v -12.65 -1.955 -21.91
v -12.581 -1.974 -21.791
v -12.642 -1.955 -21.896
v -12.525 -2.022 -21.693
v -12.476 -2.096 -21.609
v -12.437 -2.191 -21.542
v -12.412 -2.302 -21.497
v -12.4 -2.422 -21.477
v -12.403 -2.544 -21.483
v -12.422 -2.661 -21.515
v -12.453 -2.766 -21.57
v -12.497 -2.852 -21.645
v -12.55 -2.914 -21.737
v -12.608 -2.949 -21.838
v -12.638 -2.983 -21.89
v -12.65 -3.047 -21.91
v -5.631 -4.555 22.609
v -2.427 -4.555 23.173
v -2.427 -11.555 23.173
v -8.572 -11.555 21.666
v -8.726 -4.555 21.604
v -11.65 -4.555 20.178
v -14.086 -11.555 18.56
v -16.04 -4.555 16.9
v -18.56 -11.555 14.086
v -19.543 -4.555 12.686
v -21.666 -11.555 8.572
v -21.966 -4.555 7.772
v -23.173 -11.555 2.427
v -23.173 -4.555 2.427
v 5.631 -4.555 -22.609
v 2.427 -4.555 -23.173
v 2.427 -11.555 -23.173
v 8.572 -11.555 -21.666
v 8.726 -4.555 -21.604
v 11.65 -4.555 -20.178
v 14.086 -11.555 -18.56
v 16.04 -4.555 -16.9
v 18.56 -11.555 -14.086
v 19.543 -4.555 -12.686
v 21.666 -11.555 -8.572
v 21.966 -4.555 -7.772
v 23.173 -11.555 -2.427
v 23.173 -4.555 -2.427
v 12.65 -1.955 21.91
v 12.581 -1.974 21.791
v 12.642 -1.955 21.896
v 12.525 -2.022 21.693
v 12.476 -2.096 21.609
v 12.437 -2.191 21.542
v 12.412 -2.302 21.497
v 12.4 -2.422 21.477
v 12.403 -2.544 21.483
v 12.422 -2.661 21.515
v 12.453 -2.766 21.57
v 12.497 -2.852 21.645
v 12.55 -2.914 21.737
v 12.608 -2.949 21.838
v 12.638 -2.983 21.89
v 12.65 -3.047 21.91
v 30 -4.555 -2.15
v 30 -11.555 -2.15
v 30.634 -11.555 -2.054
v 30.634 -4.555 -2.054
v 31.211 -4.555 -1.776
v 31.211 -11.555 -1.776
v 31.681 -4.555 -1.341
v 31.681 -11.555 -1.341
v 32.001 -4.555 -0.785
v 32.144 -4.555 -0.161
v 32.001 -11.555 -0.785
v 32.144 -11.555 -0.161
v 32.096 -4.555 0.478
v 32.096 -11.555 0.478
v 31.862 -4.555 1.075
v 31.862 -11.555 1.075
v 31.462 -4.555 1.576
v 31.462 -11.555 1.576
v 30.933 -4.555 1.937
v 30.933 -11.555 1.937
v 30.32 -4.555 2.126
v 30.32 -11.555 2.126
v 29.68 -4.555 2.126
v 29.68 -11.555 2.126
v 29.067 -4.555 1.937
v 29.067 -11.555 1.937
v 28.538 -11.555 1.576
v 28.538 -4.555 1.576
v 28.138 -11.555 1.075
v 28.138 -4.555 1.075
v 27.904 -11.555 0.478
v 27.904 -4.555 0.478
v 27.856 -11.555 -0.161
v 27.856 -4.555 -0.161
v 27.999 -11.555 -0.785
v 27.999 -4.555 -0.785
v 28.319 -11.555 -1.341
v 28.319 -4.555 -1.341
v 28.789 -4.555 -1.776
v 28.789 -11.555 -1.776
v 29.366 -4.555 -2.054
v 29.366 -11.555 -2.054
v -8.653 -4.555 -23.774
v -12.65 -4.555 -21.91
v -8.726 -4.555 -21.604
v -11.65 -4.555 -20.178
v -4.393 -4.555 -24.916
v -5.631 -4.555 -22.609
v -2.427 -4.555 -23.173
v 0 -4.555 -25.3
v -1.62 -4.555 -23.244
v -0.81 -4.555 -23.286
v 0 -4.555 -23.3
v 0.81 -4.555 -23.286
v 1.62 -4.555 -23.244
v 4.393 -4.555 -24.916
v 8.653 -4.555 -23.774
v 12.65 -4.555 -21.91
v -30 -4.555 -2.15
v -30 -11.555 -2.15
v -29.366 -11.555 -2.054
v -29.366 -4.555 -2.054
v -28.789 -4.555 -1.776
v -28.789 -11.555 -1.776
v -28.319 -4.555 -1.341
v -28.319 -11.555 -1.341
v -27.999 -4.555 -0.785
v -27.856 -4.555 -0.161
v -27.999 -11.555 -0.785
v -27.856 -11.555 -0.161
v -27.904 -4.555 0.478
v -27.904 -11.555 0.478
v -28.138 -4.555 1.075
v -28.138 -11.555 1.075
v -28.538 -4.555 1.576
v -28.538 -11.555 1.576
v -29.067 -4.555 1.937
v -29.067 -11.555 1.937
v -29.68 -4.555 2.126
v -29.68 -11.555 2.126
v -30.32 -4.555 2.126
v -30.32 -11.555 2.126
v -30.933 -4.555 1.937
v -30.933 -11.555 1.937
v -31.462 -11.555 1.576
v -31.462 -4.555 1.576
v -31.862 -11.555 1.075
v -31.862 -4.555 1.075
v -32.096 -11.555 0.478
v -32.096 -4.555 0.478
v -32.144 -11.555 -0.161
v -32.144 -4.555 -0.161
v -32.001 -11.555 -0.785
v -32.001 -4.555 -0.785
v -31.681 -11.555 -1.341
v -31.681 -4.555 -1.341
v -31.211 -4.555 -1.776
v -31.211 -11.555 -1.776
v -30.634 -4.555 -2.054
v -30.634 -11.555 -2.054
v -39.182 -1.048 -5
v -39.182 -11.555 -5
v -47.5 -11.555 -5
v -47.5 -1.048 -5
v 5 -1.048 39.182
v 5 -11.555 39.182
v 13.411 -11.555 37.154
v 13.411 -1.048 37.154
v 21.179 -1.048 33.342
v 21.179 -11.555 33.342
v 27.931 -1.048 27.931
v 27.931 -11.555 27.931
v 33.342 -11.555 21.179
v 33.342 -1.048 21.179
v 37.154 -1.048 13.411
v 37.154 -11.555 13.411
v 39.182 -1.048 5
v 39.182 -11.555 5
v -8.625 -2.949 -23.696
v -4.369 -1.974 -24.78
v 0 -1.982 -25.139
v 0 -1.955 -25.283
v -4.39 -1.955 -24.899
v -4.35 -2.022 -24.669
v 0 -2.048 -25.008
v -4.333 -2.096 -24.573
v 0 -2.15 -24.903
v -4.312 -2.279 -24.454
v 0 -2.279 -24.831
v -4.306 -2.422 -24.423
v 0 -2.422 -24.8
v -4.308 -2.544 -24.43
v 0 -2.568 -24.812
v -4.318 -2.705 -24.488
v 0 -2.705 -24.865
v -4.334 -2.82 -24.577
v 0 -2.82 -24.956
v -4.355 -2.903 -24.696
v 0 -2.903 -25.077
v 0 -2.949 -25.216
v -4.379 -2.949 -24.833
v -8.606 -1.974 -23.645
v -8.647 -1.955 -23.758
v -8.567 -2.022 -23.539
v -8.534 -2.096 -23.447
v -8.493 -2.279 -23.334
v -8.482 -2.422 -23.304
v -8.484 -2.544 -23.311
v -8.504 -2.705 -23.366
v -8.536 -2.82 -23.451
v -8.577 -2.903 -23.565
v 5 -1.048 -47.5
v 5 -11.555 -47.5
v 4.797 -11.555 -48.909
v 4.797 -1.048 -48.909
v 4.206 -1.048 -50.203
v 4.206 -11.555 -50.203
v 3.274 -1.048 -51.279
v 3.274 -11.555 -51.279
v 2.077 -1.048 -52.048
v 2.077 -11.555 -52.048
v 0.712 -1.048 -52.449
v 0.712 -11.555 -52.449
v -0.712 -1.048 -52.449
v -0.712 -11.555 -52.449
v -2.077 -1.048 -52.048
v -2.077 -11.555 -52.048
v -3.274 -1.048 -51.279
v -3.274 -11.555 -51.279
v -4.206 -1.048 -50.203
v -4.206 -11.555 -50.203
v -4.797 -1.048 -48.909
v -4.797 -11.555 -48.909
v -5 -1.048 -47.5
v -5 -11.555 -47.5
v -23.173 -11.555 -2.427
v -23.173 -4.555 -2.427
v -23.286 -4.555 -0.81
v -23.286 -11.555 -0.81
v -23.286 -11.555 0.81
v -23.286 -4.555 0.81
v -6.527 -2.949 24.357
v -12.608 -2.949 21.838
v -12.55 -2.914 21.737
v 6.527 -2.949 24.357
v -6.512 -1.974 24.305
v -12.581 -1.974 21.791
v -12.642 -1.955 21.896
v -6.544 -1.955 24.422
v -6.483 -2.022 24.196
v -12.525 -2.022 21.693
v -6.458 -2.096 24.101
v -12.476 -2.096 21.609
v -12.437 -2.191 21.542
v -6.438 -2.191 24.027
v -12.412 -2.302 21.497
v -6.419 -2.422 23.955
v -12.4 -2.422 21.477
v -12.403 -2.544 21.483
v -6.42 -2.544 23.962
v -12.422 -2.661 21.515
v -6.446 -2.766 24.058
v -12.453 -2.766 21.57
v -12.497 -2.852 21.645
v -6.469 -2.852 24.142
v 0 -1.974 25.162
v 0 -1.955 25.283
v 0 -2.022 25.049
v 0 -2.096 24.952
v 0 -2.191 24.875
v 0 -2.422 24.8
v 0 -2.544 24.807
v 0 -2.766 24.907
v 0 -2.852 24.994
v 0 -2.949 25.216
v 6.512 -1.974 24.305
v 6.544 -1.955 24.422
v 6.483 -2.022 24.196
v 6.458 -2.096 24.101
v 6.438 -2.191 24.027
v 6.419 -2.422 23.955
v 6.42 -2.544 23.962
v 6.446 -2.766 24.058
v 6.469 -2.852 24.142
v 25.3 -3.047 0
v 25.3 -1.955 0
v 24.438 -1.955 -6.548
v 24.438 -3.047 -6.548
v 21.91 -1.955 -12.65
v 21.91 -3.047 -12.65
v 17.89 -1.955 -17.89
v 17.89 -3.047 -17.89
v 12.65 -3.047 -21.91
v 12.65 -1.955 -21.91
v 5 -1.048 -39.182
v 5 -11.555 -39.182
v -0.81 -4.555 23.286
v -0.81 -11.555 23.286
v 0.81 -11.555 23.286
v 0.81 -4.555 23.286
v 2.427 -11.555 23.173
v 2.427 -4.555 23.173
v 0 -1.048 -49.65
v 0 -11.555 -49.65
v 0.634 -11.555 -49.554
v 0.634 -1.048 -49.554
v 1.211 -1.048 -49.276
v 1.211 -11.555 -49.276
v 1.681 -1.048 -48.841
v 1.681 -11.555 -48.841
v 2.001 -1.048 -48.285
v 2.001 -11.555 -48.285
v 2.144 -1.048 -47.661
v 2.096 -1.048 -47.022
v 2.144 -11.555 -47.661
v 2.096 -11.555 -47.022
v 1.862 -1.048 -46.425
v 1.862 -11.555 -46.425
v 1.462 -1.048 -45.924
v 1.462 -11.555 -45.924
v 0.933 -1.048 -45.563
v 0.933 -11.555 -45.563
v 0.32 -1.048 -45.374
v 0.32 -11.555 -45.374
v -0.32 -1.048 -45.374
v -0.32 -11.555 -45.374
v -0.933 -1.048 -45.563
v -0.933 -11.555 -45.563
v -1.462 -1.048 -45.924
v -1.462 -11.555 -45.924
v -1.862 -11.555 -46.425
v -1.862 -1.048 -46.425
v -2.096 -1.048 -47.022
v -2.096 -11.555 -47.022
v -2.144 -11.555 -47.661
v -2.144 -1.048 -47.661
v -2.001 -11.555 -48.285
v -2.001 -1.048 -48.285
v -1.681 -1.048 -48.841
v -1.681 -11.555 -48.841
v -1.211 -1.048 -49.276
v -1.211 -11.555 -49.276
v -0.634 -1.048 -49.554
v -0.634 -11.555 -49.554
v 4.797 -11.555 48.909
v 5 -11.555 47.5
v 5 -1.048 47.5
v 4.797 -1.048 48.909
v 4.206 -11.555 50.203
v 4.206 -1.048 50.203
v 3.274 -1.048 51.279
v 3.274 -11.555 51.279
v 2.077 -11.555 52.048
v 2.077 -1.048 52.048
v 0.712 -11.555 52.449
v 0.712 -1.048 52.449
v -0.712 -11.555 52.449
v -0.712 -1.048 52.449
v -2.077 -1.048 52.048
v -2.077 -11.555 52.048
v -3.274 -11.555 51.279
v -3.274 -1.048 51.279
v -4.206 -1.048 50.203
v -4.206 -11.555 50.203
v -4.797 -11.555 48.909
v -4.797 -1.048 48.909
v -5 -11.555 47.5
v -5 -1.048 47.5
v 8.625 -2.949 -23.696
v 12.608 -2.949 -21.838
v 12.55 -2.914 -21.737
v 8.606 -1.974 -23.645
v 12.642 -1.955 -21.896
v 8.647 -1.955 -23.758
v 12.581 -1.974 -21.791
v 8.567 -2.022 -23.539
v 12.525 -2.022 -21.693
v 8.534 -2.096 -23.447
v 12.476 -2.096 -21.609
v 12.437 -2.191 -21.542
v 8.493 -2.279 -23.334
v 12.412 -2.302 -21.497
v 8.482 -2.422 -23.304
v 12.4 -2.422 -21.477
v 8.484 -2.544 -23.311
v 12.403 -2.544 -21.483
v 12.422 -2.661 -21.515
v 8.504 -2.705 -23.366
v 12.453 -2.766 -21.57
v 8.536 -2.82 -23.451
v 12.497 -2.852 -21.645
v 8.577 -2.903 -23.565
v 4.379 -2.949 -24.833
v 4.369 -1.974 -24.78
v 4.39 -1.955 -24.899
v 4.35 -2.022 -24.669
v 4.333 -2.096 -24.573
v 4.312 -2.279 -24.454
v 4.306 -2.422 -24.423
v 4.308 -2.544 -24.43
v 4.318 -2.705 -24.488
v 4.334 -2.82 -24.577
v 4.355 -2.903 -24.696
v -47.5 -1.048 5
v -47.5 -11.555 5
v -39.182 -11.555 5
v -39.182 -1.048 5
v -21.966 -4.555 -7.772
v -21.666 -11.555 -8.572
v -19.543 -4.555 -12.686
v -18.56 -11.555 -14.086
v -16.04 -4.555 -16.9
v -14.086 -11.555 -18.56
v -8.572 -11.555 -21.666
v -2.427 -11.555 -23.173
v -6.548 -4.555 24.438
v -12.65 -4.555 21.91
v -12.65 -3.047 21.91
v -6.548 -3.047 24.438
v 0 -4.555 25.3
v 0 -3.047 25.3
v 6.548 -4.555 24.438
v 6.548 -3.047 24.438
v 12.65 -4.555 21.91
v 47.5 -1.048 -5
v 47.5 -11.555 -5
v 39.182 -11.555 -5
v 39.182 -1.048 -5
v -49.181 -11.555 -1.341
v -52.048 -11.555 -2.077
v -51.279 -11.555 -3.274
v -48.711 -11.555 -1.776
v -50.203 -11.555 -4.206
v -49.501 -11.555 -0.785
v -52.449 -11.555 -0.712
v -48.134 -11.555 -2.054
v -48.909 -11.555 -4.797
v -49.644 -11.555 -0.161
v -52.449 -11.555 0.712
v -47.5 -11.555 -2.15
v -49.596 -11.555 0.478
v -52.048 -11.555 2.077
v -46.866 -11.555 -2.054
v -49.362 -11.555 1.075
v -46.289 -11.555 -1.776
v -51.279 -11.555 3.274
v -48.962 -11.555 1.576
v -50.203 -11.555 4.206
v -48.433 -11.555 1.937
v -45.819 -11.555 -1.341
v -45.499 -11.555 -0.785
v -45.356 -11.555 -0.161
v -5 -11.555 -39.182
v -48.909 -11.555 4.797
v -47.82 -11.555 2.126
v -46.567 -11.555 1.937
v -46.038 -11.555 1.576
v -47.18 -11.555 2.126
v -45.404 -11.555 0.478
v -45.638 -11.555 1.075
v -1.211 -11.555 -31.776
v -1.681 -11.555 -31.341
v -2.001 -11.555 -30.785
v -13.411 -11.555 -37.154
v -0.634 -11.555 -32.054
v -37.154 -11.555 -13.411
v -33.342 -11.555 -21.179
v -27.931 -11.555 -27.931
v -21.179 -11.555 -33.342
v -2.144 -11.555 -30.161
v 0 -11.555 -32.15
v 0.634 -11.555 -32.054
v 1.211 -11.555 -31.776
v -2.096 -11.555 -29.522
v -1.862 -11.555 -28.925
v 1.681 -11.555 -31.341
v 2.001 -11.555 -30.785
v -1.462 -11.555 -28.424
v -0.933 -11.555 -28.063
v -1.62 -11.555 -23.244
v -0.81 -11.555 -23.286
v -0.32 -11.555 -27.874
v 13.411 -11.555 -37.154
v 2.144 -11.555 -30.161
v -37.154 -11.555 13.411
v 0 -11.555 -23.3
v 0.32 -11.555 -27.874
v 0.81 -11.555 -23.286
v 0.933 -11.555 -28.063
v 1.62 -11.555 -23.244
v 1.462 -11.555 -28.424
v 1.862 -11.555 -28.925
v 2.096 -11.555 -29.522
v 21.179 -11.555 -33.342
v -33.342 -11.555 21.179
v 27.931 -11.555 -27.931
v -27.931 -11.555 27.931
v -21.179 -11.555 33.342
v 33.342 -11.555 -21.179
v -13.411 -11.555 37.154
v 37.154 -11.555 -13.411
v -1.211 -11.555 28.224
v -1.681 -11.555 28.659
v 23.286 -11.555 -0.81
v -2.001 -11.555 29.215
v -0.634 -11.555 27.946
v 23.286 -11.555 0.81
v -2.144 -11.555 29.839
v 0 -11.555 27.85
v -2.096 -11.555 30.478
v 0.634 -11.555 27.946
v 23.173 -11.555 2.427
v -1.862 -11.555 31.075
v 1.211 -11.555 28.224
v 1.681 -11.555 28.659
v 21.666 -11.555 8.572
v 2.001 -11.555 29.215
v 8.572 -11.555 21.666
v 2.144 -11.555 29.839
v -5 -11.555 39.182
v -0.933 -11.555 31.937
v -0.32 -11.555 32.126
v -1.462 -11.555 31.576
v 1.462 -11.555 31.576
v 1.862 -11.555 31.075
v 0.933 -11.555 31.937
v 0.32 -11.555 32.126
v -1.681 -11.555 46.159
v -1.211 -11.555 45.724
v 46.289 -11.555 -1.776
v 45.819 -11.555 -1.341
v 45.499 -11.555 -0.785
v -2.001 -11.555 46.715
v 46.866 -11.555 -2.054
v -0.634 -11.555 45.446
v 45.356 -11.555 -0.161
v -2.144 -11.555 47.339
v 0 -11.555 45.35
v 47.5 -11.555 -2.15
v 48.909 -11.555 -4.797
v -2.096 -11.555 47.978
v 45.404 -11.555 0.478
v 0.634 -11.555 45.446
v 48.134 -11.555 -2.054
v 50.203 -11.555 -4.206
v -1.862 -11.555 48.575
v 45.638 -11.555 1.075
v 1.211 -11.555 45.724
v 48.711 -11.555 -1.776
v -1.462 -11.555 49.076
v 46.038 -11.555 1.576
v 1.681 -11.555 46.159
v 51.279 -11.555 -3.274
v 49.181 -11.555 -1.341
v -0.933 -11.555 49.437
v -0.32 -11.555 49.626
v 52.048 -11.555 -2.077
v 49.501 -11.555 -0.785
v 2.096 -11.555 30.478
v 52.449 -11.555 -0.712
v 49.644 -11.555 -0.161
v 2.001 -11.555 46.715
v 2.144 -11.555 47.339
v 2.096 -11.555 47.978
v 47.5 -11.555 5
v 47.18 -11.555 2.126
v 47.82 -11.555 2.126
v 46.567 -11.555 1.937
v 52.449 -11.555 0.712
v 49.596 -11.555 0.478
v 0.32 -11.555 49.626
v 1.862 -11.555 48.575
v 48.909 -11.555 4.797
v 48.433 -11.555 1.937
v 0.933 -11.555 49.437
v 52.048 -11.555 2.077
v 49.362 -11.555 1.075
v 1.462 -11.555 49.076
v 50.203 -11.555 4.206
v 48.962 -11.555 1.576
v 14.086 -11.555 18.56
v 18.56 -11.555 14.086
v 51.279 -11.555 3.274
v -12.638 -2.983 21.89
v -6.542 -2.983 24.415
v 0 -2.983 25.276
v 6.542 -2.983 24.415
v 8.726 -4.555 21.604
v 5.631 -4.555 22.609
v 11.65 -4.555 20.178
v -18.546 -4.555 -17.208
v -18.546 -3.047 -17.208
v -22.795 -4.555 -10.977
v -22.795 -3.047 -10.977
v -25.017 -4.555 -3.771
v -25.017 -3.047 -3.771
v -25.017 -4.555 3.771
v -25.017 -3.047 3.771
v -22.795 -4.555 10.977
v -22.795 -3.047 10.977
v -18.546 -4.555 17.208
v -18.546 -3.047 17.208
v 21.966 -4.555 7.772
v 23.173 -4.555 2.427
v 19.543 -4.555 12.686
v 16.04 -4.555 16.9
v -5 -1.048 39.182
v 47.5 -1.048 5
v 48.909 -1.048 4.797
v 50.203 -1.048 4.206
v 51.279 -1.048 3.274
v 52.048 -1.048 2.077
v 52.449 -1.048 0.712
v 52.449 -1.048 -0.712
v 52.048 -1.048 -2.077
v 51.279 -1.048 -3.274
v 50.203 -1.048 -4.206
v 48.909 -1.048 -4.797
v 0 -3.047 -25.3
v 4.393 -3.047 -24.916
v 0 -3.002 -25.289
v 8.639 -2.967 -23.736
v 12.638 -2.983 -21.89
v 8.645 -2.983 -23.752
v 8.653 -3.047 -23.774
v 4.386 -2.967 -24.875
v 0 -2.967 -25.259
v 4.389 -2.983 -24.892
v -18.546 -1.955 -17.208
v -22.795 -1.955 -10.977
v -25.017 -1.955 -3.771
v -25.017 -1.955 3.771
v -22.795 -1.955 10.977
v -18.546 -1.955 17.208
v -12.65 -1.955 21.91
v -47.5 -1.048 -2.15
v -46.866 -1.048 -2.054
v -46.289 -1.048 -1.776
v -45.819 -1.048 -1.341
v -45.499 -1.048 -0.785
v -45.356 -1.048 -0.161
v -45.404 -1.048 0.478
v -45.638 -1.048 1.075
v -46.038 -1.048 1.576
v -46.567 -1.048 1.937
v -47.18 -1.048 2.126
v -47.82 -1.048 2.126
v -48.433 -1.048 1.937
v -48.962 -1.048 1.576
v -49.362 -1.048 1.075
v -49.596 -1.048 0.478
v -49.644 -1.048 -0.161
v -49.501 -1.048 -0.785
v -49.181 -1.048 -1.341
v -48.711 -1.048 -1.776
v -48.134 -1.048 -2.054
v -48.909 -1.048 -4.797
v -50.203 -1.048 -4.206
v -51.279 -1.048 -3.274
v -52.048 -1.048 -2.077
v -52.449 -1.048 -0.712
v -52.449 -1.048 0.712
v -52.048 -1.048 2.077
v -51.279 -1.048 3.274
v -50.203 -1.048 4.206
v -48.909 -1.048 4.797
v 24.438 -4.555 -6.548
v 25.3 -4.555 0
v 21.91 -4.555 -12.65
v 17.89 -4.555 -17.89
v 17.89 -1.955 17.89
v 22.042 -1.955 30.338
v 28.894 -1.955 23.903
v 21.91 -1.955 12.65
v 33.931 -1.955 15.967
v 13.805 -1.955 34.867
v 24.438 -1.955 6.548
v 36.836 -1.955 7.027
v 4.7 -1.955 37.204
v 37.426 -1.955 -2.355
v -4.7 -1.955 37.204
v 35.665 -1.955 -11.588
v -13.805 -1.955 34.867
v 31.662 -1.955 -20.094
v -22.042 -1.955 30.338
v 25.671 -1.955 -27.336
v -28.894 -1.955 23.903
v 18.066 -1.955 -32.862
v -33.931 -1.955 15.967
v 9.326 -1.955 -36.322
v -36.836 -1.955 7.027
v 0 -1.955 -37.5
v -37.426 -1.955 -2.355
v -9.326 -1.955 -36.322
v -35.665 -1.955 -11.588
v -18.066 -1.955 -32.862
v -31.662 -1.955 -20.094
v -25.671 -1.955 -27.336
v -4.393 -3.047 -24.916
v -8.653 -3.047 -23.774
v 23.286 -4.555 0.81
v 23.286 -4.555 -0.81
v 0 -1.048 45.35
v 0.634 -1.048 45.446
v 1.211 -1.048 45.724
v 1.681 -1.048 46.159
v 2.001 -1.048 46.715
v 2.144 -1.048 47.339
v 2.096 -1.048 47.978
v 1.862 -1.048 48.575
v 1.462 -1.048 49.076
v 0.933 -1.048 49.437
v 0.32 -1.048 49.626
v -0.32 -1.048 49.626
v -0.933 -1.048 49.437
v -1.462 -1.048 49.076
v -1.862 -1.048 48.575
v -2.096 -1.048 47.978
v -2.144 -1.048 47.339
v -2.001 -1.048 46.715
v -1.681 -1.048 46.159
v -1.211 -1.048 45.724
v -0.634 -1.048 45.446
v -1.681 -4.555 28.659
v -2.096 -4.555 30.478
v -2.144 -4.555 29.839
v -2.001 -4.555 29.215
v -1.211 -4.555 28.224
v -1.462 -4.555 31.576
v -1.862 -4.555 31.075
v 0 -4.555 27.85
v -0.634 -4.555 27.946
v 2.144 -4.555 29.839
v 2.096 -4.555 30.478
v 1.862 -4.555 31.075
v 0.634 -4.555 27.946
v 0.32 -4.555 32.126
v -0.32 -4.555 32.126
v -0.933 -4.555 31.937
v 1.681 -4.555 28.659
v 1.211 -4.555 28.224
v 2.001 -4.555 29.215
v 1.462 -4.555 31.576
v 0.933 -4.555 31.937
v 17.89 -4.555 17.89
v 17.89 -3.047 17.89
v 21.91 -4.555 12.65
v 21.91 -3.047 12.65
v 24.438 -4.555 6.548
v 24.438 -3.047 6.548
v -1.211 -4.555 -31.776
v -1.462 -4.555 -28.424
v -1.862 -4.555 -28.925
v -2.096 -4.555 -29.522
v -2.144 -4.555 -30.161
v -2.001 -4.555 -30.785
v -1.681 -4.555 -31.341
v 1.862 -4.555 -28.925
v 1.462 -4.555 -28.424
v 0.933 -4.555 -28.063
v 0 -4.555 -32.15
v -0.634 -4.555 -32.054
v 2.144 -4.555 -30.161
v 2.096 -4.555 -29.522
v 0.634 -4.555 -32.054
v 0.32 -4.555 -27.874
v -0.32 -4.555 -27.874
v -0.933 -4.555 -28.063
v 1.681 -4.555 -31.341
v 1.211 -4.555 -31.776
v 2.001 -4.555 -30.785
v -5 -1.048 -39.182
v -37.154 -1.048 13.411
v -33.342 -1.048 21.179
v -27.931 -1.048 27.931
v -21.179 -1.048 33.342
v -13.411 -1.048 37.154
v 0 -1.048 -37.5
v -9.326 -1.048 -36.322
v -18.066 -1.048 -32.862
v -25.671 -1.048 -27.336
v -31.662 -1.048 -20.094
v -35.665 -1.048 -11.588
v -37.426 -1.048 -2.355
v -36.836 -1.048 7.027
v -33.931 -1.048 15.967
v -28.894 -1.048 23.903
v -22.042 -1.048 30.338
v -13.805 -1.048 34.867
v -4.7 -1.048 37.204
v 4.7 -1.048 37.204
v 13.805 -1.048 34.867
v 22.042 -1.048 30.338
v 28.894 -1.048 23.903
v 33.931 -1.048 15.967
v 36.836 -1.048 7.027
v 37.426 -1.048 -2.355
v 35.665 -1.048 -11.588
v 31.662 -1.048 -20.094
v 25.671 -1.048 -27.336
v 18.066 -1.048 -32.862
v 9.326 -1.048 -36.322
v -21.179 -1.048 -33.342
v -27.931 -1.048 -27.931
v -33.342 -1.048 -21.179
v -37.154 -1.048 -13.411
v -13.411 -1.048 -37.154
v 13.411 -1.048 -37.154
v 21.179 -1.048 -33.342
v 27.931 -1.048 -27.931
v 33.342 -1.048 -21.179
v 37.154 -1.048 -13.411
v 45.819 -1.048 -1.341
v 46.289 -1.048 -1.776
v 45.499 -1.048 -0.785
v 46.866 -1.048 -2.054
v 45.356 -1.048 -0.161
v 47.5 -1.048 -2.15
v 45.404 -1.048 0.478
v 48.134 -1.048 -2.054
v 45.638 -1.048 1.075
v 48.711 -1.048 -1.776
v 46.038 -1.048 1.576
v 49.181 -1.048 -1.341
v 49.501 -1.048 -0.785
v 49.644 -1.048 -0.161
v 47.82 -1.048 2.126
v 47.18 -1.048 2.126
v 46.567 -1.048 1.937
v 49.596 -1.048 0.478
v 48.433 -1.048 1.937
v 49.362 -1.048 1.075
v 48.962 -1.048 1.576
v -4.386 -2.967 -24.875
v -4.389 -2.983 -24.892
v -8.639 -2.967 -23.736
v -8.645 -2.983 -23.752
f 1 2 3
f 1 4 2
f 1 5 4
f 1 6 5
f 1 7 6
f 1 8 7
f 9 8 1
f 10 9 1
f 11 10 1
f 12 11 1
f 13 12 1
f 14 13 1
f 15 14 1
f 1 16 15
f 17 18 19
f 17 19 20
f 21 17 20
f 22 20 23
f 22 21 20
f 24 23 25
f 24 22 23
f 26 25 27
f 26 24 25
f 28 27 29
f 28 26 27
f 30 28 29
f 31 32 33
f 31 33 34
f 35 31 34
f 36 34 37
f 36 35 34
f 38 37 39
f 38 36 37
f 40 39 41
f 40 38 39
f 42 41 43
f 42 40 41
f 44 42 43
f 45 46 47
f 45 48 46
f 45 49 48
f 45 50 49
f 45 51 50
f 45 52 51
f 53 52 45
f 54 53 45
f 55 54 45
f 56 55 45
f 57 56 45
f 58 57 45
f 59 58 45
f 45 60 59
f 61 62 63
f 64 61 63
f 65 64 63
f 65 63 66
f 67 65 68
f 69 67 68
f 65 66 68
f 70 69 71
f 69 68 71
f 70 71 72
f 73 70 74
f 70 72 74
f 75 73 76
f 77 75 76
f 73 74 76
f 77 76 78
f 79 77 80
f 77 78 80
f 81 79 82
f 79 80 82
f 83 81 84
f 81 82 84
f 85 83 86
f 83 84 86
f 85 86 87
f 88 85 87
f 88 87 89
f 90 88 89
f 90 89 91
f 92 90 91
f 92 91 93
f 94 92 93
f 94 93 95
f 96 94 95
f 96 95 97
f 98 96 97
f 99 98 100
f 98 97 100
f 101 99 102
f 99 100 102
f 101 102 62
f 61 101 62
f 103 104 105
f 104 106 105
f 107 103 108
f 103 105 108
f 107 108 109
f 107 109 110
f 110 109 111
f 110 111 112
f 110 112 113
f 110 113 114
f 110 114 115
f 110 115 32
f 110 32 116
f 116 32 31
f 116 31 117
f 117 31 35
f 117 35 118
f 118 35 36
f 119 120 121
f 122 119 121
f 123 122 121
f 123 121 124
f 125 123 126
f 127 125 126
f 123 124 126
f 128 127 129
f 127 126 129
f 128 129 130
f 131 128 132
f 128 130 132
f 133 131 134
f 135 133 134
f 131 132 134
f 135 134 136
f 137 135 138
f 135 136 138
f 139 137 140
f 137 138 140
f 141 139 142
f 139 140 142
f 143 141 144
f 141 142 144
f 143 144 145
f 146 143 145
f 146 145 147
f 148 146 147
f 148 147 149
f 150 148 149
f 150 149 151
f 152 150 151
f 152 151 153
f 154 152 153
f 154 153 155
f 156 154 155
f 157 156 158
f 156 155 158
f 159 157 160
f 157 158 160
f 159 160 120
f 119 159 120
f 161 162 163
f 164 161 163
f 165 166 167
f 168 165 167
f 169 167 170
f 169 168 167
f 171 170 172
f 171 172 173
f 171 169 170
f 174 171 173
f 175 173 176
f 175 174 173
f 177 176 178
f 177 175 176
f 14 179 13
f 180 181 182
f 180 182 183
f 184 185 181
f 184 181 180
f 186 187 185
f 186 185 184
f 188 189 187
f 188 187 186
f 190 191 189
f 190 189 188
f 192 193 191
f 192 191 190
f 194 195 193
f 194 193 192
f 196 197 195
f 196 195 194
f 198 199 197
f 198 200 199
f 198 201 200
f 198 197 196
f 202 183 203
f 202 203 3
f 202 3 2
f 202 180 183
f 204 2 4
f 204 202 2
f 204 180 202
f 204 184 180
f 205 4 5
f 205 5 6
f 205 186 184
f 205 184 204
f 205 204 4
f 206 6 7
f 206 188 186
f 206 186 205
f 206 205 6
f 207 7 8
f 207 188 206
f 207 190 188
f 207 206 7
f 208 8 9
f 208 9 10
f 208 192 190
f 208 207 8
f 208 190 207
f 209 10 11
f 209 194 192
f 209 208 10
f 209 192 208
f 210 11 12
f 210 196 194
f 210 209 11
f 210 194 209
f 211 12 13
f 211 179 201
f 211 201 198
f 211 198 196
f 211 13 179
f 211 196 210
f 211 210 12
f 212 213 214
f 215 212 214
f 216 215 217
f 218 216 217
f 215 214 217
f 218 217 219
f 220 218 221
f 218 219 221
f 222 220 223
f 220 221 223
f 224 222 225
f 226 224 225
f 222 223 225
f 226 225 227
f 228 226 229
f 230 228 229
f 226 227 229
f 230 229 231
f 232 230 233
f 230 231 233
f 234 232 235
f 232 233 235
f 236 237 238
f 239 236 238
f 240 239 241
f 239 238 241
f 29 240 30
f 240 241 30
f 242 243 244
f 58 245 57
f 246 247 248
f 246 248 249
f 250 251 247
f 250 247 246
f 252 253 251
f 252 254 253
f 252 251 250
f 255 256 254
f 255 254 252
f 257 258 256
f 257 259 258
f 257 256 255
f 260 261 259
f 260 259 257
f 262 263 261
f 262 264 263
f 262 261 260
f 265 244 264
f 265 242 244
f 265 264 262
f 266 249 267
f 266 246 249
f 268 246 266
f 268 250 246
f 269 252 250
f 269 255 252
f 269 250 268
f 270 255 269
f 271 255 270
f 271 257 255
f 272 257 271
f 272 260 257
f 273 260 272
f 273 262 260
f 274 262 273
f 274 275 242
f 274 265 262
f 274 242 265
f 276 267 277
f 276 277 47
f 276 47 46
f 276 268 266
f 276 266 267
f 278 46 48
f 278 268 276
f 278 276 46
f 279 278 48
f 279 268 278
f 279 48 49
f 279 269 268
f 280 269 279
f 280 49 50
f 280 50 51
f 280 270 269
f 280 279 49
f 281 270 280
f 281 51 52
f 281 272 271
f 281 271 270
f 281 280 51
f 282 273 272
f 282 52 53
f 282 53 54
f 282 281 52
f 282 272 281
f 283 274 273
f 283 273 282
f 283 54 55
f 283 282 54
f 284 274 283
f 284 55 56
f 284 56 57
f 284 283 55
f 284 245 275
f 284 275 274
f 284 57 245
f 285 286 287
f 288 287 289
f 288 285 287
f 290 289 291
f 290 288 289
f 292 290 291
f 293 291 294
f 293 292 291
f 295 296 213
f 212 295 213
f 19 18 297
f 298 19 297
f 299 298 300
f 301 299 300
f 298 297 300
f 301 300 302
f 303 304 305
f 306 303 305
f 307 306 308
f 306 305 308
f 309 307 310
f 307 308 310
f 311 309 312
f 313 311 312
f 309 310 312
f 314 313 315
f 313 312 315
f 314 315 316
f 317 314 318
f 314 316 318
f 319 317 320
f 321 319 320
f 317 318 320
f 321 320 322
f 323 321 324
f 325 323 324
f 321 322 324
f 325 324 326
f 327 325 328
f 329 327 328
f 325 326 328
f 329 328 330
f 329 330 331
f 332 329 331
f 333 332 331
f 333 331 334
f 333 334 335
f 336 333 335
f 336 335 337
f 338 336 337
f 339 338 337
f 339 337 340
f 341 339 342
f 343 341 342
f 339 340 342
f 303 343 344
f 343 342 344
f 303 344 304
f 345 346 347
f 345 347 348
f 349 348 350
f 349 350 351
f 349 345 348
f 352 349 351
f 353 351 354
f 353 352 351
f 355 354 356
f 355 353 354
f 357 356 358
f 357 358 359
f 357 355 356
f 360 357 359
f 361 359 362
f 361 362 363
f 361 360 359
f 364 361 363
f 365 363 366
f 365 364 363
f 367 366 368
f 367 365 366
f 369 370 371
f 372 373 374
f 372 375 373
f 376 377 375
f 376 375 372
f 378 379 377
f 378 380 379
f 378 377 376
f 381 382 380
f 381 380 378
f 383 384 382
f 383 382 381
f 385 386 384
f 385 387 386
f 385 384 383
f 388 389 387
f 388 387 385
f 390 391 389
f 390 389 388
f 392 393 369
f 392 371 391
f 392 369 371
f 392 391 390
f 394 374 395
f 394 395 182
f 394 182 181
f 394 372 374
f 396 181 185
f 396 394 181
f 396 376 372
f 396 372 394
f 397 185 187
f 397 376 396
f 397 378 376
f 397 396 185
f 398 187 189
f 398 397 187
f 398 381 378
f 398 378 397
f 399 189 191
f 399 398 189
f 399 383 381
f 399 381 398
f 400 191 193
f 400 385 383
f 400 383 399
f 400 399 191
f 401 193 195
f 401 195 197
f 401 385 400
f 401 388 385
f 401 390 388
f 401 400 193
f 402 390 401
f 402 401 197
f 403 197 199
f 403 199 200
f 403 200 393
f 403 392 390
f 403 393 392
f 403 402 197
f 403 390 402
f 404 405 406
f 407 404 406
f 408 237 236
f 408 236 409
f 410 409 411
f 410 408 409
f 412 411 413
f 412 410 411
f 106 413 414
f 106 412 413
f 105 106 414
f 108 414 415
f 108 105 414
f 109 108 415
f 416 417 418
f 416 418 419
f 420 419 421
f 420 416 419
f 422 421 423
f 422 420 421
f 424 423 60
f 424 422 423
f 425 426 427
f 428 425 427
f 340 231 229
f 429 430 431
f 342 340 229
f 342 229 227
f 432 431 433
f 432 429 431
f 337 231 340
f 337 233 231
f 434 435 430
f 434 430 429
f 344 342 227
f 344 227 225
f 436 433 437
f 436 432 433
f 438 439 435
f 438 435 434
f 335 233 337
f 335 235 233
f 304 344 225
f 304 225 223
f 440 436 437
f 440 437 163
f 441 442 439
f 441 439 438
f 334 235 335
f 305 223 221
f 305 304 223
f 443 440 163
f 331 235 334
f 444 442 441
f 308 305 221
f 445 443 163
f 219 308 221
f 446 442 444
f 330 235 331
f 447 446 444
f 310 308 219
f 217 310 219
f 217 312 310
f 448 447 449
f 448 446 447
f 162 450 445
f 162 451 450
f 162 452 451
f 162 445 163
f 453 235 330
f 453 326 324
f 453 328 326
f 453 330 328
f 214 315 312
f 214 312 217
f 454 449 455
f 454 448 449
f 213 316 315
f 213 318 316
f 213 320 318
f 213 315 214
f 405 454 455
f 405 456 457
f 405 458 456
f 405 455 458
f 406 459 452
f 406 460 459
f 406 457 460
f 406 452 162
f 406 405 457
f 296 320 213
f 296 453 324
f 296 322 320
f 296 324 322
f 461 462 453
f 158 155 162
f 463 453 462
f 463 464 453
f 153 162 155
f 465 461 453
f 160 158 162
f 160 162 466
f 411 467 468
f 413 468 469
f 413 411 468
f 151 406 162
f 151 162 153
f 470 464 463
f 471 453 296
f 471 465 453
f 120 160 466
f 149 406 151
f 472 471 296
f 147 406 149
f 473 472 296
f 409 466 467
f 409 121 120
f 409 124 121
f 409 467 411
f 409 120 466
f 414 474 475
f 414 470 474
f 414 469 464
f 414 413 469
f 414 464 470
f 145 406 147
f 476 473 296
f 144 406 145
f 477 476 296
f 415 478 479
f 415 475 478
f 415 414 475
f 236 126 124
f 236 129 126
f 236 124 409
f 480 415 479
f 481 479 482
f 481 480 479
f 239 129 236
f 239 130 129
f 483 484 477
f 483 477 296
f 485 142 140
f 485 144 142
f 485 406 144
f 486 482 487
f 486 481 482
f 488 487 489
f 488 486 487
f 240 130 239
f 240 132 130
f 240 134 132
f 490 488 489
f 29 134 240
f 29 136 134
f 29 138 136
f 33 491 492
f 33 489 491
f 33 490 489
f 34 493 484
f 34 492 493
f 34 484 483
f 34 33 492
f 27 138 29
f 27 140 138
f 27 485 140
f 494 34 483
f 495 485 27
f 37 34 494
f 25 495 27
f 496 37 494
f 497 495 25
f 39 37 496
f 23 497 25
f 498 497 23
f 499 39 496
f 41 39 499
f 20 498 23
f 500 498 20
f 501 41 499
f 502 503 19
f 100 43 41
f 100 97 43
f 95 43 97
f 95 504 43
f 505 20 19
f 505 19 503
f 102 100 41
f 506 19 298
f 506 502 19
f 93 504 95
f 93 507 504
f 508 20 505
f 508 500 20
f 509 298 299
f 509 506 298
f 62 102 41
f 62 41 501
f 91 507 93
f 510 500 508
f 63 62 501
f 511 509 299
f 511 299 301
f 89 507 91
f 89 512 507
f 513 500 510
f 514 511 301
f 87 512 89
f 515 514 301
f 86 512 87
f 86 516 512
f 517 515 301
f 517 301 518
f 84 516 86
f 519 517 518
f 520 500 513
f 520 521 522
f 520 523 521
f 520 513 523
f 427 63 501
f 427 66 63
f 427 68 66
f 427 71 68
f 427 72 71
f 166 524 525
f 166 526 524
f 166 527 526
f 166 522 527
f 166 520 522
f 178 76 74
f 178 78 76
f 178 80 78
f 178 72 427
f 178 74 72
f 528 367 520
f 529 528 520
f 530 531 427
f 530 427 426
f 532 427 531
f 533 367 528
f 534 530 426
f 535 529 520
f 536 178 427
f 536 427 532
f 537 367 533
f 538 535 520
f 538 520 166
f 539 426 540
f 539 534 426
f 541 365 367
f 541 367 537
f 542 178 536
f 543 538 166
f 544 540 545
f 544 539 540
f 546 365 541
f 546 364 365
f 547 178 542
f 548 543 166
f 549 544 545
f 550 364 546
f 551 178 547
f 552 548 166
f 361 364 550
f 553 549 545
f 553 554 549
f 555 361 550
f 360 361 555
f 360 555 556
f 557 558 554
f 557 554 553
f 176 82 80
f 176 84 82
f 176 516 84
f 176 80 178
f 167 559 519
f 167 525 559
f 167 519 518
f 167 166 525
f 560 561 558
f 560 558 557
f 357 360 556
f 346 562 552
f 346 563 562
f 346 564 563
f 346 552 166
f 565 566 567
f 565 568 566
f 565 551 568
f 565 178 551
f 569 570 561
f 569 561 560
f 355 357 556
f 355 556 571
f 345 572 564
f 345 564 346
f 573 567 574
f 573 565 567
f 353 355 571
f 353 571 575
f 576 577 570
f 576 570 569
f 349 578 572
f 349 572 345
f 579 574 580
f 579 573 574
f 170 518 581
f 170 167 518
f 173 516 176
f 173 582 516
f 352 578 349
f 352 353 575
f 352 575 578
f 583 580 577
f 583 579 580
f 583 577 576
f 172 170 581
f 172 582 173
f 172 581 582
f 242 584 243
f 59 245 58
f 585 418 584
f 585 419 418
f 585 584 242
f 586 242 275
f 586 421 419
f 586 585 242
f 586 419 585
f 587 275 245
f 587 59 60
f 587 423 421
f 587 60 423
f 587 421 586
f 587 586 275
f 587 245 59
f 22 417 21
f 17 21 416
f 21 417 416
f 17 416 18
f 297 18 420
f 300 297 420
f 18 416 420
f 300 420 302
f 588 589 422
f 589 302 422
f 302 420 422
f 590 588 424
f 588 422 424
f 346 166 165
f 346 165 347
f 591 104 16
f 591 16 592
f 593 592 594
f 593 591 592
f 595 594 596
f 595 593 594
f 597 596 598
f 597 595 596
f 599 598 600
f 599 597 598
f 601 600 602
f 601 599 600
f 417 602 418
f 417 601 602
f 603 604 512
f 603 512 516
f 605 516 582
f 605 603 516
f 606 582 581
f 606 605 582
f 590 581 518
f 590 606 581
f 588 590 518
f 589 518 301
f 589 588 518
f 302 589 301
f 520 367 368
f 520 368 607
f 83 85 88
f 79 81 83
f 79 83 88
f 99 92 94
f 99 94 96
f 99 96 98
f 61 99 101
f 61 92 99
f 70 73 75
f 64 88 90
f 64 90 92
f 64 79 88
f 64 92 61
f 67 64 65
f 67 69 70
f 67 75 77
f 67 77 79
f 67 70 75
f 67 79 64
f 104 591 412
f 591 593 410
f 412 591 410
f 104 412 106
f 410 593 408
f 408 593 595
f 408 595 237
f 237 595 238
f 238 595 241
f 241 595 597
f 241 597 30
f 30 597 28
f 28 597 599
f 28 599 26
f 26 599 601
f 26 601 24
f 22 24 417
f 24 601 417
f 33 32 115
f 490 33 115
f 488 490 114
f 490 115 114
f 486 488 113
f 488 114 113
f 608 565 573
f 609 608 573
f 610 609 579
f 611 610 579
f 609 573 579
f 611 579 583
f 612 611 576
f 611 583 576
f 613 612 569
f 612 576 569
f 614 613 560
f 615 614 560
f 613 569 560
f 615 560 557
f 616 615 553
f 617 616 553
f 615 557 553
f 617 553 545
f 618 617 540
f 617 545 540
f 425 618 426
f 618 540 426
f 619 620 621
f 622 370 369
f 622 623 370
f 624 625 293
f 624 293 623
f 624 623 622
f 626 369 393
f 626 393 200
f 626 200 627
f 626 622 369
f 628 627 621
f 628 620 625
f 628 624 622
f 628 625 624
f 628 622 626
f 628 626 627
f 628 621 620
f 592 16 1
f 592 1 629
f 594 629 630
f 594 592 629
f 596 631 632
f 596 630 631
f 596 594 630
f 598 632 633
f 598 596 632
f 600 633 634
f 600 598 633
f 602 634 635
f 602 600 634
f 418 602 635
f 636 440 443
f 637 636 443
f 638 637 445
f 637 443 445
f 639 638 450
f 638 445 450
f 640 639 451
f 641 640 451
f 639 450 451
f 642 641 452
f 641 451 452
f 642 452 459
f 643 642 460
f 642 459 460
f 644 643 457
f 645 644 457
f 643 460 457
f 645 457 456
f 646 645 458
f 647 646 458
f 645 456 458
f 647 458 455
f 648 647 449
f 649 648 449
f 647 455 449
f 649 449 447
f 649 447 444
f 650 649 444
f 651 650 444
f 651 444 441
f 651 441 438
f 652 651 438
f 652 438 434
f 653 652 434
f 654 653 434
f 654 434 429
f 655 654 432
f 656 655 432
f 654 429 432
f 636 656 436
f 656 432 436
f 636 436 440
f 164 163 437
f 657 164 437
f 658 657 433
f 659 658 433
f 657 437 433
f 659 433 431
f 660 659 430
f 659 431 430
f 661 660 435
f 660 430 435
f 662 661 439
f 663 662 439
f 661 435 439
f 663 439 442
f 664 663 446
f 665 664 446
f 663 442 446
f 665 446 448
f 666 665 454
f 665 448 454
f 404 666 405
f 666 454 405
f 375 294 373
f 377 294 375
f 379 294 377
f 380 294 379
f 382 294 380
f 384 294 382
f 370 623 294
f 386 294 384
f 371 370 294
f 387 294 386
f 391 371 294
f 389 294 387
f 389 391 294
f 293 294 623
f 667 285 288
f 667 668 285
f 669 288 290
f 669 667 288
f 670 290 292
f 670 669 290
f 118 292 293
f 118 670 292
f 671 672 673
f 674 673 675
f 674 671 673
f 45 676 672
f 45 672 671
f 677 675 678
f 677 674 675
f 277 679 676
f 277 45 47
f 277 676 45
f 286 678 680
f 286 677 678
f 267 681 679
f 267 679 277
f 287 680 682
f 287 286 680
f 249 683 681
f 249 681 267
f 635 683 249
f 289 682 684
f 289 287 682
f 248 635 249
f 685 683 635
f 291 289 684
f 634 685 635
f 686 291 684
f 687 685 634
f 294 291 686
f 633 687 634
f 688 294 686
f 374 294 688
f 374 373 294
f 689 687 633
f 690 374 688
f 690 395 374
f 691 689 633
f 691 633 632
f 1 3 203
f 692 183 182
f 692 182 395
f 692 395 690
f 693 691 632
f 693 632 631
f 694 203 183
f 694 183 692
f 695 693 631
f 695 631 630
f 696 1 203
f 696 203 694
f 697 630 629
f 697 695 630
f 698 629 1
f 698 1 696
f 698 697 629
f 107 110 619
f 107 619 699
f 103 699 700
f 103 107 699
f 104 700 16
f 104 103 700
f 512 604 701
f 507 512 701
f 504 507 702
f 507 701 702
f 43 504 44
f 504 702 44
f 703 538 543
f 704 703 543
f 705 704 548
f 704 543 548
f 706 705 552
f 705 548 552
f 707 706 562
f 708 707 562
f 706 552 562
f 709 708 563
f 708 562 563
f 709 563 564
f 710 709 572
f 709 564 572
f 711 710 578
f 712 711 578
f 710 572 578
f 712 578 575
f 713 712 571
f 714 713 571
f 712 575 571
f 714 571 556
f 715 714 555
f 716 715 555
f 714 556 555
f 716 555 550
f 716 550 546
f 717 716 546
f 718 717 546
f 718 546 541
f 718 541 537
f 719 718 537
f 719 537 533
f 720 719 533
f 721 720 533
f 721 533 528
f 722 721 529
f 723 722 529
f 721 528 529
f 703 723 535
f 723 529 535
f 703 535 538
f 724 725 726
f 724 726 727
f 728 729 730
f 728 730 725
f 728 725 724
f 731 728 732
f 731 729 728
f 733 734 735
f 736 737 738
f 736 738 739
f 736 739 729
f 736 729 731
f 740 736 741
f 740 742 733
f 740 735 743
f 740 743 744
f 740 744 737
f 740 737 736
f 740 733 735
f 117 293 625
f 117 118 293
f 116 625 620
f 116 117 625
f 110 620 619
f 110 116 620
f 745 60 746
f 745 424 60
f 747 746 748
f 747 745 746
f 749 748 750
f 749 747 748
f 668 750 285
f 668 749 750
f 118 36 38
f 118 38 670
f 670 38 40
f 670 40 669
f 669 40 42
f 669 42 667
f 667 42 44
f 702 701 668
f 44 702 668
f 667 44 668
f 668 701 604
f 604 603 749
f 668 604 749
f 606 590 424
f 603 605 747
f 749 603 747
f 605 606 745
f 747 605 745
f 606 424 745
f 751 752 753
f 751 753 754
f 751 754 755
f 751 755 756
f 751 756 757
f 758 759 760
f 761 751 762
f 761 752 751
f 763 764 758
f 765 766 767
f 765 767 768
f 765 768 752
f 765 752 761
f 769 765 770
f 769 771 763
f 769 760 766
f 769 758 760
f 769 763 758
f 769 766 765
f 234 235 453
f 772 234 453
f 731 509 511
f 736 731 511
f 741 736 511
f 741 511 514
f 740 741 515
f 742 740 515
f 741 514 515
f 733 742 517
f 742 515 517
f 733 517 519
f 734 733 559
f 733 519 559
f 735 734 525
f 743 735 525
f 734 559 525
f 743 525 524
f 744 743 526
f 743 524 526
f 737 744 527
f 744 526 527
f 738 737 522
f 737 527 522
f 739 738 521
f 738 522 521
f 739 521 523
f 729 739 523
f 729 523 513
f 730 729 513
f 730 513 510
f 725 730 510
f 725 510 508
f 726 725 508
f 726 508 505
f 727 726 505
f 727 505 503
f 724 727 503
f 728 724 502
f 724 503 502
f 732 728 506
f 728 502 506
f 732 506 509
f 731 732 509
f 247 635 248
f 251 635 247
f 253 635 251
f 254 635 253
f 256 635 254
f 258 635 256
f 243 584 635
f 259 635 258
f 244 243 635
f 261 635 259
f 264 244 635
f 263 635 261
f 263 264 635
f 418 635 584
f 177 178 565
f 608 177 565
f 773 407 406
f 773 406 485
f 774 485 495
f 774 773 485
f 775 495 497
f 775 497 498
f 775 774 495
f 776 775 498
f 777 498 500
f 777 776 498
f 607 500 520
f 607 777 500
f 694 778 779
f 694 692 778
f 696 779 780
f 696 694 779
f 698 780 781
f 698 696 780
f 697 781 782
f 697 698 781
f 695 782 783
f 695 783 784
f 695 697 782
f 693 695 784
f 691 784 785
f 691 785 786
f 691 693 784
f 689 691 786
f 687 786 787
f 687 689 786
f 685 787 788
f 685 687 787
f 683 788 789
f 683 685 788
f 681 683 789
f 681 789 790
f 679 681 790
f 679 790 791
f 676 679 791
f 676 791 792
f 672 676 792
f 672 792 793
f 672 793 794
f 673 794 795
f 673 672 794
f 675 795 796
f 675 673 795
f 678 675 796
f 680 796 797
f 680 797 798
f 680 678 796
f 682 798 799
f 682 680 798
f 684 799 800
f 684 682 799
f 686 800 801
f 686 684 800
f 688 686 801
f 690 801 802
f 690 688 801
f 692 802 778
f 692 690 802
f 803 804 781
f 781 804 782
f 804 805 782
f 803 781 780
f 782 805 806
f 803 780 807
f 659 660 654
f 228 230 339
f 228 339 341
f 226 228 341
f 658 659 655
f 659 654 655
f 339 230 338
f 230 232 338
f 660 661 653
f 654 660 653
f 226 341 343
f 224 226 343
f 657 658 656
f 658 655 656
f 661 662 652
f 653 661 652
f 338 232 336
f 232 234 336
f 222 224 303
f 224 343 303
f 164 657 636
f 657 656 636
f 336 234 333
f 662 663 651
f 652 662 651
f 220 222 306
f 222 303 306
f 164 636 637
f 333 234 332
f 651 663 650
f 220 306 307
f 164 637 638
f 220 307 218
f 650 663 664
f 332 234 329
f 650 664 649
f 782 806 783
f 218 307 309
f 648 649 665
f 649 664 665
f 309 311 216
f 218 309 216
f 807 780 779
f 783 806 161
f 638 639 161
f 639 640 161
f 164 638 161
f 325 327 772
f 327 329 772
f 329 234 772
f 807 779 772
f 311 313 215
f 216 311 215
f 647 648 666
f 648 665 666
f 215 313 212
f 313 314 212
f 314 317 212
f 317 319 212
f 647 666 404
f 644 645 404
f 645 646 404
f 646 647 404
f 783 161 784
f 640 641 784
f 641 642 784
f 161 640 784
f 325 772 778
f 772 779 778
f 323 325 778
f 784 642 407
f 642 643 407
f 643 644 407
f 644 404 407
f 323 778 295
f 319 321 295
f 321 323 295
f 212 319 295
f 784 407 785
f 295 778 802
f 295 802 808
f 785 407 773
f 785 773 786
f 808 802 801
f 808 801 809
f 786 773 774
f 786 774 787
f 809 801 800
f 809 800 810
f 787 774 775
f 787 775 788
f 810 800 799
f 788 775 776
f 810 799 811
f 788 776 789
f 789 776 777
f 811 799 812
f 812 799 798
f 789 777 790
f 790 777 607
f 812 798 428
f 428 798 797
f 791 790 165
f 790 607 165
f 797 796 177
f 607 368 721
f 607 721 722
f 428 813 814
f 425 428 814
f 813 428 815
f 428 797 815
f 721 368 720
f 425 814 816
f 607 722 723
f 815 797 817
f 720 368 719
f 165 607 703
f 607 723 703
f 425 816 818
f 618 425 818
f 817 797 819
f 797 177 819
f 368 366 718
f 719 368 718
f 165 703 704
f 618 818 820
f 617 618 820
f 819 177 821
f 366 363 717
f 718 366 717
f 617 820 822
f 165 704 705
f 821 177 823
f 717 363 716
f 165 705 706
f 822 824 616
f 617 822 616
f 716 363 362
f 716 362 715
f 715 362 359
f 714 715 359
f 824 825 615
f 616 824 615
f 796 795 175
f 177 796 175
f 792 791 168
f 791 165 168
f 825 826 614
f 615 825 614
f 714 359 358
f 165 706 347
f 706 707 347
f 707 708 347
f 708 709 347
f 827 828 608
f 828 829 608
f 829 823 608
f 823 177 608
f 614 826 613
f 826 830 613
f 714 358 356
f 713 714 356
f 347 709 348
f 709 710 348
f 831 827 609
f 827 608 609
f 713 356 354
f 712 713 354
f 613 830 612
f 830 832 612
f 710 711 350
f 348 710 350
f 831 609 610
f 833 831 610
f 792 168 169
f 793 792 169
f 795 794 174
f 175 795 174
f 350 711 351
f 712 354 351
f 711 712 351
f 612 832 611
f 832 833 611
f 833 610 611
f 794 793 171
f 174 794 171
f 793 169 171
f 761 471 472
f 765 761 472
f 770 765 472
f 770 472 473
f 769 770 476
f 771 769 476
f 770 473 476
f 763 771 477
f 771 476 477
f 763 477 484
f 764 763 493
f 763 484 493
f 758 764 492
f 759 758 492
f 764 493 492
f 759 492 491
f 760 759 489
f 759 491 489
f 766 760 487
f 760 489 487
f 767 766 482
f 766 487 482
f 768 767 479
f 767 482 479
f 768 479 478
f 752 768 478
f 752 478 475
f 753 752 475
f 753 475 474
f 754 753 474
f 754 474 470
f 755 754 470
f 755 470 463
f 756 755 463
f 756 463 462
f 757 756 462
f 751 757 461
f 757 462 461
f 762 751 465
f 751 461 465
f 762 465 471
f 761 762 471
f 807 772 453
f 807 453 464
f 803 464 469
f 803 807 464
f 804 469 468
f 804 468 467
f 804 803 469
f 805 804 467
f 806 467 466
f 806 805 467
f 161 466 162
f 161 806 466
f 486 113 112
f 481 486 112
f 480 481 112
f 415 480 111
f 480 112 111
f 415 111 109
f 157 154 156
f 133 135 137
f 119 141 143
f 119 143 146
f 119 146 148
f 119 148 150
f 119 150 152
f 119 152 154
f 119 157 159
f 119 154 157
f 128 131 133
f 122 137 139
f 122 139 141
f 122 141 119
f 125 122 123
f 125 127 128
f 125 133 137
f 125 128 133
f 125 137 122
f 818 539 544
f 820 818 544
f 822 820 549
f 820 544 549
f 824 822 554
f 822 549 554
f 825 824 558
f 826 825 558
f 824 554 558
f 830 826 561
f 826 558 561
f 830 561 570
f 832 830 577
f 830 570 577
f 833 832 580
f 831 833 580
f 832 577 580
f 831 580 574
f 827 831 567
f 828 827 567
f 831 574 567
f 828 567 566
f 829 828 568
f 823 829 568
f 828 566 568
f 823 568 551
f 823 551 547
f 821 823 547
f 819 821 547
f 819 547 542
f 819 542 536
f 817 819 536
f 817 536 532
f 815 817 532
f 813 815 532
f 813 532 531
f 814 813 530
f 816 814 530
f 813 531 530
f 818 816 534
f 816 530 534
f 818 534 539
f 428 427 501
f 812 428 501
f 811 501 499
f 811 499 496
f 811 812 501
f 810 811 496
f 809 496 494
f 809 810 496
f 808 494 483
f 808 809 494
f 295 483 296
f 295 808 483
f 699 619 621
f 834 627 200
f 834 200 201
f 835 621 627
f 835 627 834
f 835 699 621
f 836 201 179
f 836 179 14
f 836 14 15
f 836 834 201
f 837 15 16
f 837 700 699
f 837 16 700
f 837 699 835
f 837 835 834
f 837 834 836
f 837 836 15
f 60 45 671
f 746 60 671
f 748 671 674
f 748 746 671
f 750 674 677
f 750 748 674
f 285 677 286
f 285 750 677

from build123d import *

# Parameters (mm, degrees)
SKETCH2_R           = 2.15
BOSS_EXTRUDE1_DEPTH = 10.507214
CUT_EXTRUDE2_REACH  = 76.575
SKETCH4_R           = 2.15
CUT_EXTRUDE3_DEPTH  = 7
BOSS_EXTRUDE2_START = -7
SKETCH5_R           = 24.3
SKETCH5_R_2         = 23.3
BOSS_EXTRUDE2_DEPTH = 7
SKETCH6_R           = 23.3
CUT_EXTRUDE4_DEPTH  = 75.575465
CUT_EXTRUDE5_DEPTH  = 75.575465


with BuildPart() as part:
    # Sketch1 → Revolve1 (revolve)
    with BuildSketch(Plane(origin=(0, 0, 0), x_dir=(0, 0, -1), z_dir=(1, 0, 0)), mode=Mode.PRIVATE) as revolve1_sk:
        with BuildLine():
            Line((-37.5, -1.048229), (-37.5, -1.955443))
            Line((-37.5, -1.955443), (-25.283016, -1.955443))
            ThreePointArc((-25.283016, -1.955443), (-24.8, -2.421893), (-25.216498, -2.94859))
            ThreePointArc((-25.216498, -2.94859), (-25.276321, -2.982605), (-25.3, -3.04722))
            Line((-25.3, -3.04722), (-25.3, -4.555443))
            Line((-25.3, -4.555443), (-8, -4.555443))
            Line((-8, -4.555443), (-8, -11.555443))
            Line((-8, -11.555443), (-39.5, -11.555443))
            Line((-39.5, -11.555443), (-39.5, -1.048229))
            Line((-39.5, -1.048229), (-37.5, -1.048229))
        make_face()
    revolve(revolve1_sk.sketch.rotate(Axis((0, -1000, 0), (0, 1, 0)), 180), axis=Axis((0, -1000, 0), (0, 1, 0)))

    # Sketch2 → Boss-Extrude1 (add)
    # profile 1 of 4: a face of its own
    with BuildSketch(Plane.XZ.offset(11.555443)):
        with BuildLine():
            Line((-5, 47.5), (-5, 39.182266))
            Line((-5, 39.182266), (5, 39.182266))
            Line((5, 39.182266), (5, 47.5))
            ThreePointArc((5, 47.5), (0, 52.5), (-5, 47.5))
        make_face()
        with Locations(Location((0, 47.5, 0), (0, 0, 270))):
            Circle(SKETCH2_R, mode=Mode.SUBTRACT)
    # profile 2 of 4: a face of its own
    with BuildSketch(Plane.XZ.offset(11.555443)):
        with BuildLine():
            Line((47.5, -5), (39.182266, -5))
            Line((39.182266, -5), (39.182266, 5))
            Line((39.182266, 5), (47.5, 5))
            ThreePointArc((47.5, 5), (52.5, 0), (47.5, -5))
        make_face()
        with Locations(Location((47.5, 0, 0), (0, 0, 270))):
            Circle(SKETCH2_R, mode=Mode.SUBTRACT)
    # profile 3 of 4: a face of its own
    with BuildSketch(Plane.XZ.offset(11.555443)):
        with BuildLine():
            Line((-5, -47.5), (-5, -39.182266))
            Line((-5, -39.182266), (5, -39.182266))
            Line((5, -39.182266), (5, -47.5))
            ThreePointArc((5, -47.5), (0, -52.5), (-5, -47.5))
        make_face()
        with Locations(Location((0, -47.5, 0), (0, 0, 270))):
            Circle(SKETCH2_R, mode=Mode.SUBTRACT)
    # profile 4 of 4: a face of its own
    with BuildSketch(Plane.XZ.offset(11.555443)):
        with BuildLine():
            Line((-47.5, 5), (-39.182266, 5))
            Line((-39.182266, 5), (-39.182266, -5))
            Line((-39.182266, -5), (-47.5, -5))
            ThreePointArc((-47.5, -5), (-52.5, 0), (-47.5, 5))
        make_face()
        with Locations(Location((-47.5, 0, 0), (0, 0, 270))):
            Circle(SKETCH2_R, mode=Mode.SUBTRACT)
    extrude(amount=-BOSS_EXTRUDE1_DEPTH)

    # Sketch3 → Cut-Extrude2 (cut, up to next)
    with BuildSketch(Plane(origin=(0, -4.555443, 0), x_dir=(1, 0, 0), z_dir=(0, 1, 0)), mode=Mode.PRIVATE) as cut_extrude2_sk1:
        with BuildLine():
            Line((21.938323, -2), (12.369317, -2))
            ThreePointArc((12.369317, -2), (11.19262, -2.382785), (10.466345, -3.384615))
            ThreePointArc((10.466345, -3.384615), (7.778175, -7.778175), (3.384615, -10.466345))
            ThreePointArc((3.384615, -10.466345), (2.382785, -11.19262), (2, -12.369317))
            Line((2, -12.369317), (2, -21.938323))
            ThreePointArc((2, -21.938323), (2.718885, -23.474143), (4.358744, -23.905885))
            ThreePointArc((4.358744, -23.905885), (17.182695, -17.182695), (23.905885, -4.358744))
            ThreePointArc((23.905885, -4.358744), (23.474143, -2.718885), (21.938323, -2))
        make_face()
    cut_extrude2_tool1 = extrude(cut_extrude2_sk1.sketch, amount=-CUT_EXTRUDE2_REACH, mode=Mode.PRIVATE) & part.part
    # Sketch3 → Cut-Extrude2 (cut, up to next)
    with BuildSketch(Plane(origin=(0, -4.555443, 0), x_dir=(1, 0, 0), z_dir=(0, 1, 0)), mode=Mode.PRIVATE) as cut_extrude2_sk2:
        with BuildLine():
            Line((-2, -21.938323), (-2, -12.369317))
            ThreePointArc((-2, -12.369317), (-2.382785, -11.19262), (-3.384615, -10.466345))
            ThreePointArc((-3.384615, -10.466345), (-7.778175, -7.778175), (-10.466345, -3.384615))
            ThreePointArc((-10.466345, -3.384615), (-11.19262, -2.382785), (-12.369317, -2))
            Line((-12.369317, -2), (-21.938323, -2))
            ThreePointArc((-21.938323, -2), (-23.474143, -2.718885), (-23.905885, -4.358744))
            ThreePointArc((-23.905885, -4.358744), (-17.182695, -17.182695), (-4.358744, -23.905885))
            ThreePointArc((-4.358744, -23.905885), (-2.718885, -23.474143), (-2, -21.938323))
        make_face()
    cut_extrude2_tool2 = extrude(cut_extrude2_sk2.sketch, amount=-CUT_EXTRUDE2_REACH, mode=Mode.PRIVATE) & part.part
    # Sketch3 → Cut-Extrude2 (cut, up to next)
    with BuildSketch(Plane(origin=(0, -4.555443, 0), x_dir=(1, 0, 0), z_dir=(0, 1, 0)), mode=Mode.PRIVATE) as cut_extrude2_sk3:
        with BuildLine():
            Line((-21.938323, 2), (-12.369317, 2))
            ThreePointArc((-12.369317, 2), (-11.19262, 2.382785), (-10.466345, 3.384615))
            ThreePointArc((-10.466345, 3.384615), (-7.778175, 7.778175), (-3.384615, 10.466345))
            ThreePointArc((-3.384615, 10.466345), (-2.382785, 11.19262), (-2, 12.369317))
            Line((-2, 12.369317), (-2, 21.938323))
            ThreePointArc((-2, 21.938323), (-2.718885, 23.474143), (-4.358744, 23.905885))
            ThreePointArc((-4.358744, 23.905885), (-17.182695, 17.182695), (-23.905885, 4.358744))
            ThreePointArc((-23.905885, 4.358744), (-23.474143, 2.718885), (-21.938323, 2))
        make_face()
    cut_extrude2_tool3 = extrude(cut_extrude2_sk3.sketch, amount=-CUT_EXTRUDE2_REACH, mode=Mode.PRIVATE) & part.part
    # Sketch3 → Cut-Extrude2 (cut, up to next)
    with BuildSketch(Plane(origin=(0, -4.555443, 0), x_dir=(1, 0, 0), z_dir=(0, 1, 0)), mode=Mode.PRIVATE) as cut_extrude2_sk4:
        with BuildLine():
            Line((2, 21.938323), (2, 12.369317))
            ThreePointArc((2, 12.369317), (2.382785, 11.19262), (3.384615, 10.466345))
            ThreePointArc((3.384615, 10.466345), (7.778175, 7.778175), (10.466345, 3.384615))
            ThreePointArc((10.466345, 3.384615), (11.19262, 2.382785), (12.369317, 2))
            Line((12.369317, 2), (21.938323, 2))
            ThreePointArc((21.938323, 2), (23.474143, 2.718885), (23.905885, 4.358744))
            ThreePointArc((23.905885, 4.358744), (17.182695, 17.182695), (4.358744, 23.905885))
            ThreePointArc((4.358744, 23.905885), (2.718885, 23.474143), (2, 21.938323))
        make_face()
    cut_extrude2_tool4 = extrude(cut_extrude2_sk4.sketch, amount=-CUT_EXTRUDE2_REACH, mode=Mode.PRIVATE) & part.part
    add(cut_extrude2_tool1.solids().sort_by_distance((12.193258, -4.555443, 12.193258))[0], mode=Mode.SUBTRACT)
    add(cut_extrude2_tool2.solids().sort_by_distance((-12.193258, -4.555443, 12.193258))[0], mode=Mode.SUBTRACT)
    add(cut_extrude2_tool3.solids().sort_by_distance((-12.193258, -4.555443, -12.193258))[0], mode=Mode.SUBTRACT)
    add(cut_extrude2_tool4.solids().sort_by_distance((12.193258, -4.555443, -12.193258))[0], mode=Mode.SUBTRACT)

    # Sketch4 → Cut-Extrude3 (cut)
    with BuildSketch(Plane(origin=(0, -11.555443, 0), x_dir=(-1, 0, 0), z_dir=(0, -1, 0))):
        with Locations(Location((30, 0, 0), (0, 0, 90))):
            Circle(SKETCH4_R)
        with Locations(Location((0, -30, 0), (0, 0, 90))):
            Circle(SKETCH4_R)
        with Locations(Location((-30, 0, 0), (0, 0, 90))):
            Circle(SKETCH4_R)
        with Locations(Location((0, 30, 0), (0, 0, 90))):
            Circle(SKETCH4_R)
    extrude(amount=-CUT_EXTRUDE3_DEPTH, mode=Mode.SUBTRACT)

    # Sketch5 → Boss-Extrude2 (add)
    with BuildSketch(Plane.XZ.offset(11.555443).offset(BOSS_EXTRUDE2_START)):
        Circle(SKETCH5_R)
        Circle(SKETCH5_R_2, mode=Mode.SUBTRACT)
    extrude(amount=BOSS_EXTRUDE2_DEPTH)

    # Sketch6 → Cut-Extrude4 (cut, through all)
    with BuildSketch(Plane(origin=(0, -4.555443, 0), x_dir=(1, 0, 0), z_dir=(0, 1, 0))):
        with Locations(Location((0, 0, 0), (0, 0, 90))):
            Circle(SKETCH6_R)
    extrude(amount=-CUT_EXTRUDE4_DEPTH, mode=Mode.SUBTRACT)

    # Sketch7 → Cut-Extrude5 (cut, through all)
    with BuildSketch(Plane(origin=(0, -4.555443, 0), x_dir=(1, 0, 0), z_dir=(0, 1, 0))):
        with BuildLine():
            Line((11.65, 20.178392), (0, 0))
            Line((0, 0), (11.65, -20.178392))
            ThreePointArc((11.65, -20.178392), (20.178392, -11.65), (23.3, 0))
            ThreePointArc((23.3, 0), (20.178392, 11.65), (11.65, 20.178392))
        make_face()
        with BuildLine():
            Line((-11.65, -20.178392), (0, 0))
            Line((0, 0), (-11.65, 20.178392))
            ThreePointArc((-11.65, 20.178392), (-23.3, 0), (-11.65, -20.178392))
        make_face()
        with BuildLine():
            ThreePointArc((23.3, 0), (20.178392, -11.65), (11.65, -20.178392))
            Line((11.65, -20.178392), (12.65, -21.910443))
            ThreePointArc((12.65, -21.910443), (21.910443, -12.65), (25.3, 0))
            ThreePointArc((25.3, 0), (21.910443, 12.65), (12.65, 21.910443))
            Line((12.65, 21.910443), (11.65, 20.178392))
            ThreePointArc((11.65, 20.178392), (20.178392, 11.65), (23.3, 0))
        make_face()
        with BuildLine():
            Line((-12.65, -21.910443), (-11.65, -20.178392))
            ThreePointArc((-11.65, -20.178392), (-23.3, 0), (-11.65, 20.178392))
            Line((-11.65, 20.178392), (-12.65, 21.910443))
            ThreePointArc((-12.65, 21.910443), (-25.3, 0), (-12.65, -21.910443))
        make_face()
    extrude(amount=CUT_EXTRUDE5_DEPTH, mode=Mode.SUBTRACT)


solid = part.part
